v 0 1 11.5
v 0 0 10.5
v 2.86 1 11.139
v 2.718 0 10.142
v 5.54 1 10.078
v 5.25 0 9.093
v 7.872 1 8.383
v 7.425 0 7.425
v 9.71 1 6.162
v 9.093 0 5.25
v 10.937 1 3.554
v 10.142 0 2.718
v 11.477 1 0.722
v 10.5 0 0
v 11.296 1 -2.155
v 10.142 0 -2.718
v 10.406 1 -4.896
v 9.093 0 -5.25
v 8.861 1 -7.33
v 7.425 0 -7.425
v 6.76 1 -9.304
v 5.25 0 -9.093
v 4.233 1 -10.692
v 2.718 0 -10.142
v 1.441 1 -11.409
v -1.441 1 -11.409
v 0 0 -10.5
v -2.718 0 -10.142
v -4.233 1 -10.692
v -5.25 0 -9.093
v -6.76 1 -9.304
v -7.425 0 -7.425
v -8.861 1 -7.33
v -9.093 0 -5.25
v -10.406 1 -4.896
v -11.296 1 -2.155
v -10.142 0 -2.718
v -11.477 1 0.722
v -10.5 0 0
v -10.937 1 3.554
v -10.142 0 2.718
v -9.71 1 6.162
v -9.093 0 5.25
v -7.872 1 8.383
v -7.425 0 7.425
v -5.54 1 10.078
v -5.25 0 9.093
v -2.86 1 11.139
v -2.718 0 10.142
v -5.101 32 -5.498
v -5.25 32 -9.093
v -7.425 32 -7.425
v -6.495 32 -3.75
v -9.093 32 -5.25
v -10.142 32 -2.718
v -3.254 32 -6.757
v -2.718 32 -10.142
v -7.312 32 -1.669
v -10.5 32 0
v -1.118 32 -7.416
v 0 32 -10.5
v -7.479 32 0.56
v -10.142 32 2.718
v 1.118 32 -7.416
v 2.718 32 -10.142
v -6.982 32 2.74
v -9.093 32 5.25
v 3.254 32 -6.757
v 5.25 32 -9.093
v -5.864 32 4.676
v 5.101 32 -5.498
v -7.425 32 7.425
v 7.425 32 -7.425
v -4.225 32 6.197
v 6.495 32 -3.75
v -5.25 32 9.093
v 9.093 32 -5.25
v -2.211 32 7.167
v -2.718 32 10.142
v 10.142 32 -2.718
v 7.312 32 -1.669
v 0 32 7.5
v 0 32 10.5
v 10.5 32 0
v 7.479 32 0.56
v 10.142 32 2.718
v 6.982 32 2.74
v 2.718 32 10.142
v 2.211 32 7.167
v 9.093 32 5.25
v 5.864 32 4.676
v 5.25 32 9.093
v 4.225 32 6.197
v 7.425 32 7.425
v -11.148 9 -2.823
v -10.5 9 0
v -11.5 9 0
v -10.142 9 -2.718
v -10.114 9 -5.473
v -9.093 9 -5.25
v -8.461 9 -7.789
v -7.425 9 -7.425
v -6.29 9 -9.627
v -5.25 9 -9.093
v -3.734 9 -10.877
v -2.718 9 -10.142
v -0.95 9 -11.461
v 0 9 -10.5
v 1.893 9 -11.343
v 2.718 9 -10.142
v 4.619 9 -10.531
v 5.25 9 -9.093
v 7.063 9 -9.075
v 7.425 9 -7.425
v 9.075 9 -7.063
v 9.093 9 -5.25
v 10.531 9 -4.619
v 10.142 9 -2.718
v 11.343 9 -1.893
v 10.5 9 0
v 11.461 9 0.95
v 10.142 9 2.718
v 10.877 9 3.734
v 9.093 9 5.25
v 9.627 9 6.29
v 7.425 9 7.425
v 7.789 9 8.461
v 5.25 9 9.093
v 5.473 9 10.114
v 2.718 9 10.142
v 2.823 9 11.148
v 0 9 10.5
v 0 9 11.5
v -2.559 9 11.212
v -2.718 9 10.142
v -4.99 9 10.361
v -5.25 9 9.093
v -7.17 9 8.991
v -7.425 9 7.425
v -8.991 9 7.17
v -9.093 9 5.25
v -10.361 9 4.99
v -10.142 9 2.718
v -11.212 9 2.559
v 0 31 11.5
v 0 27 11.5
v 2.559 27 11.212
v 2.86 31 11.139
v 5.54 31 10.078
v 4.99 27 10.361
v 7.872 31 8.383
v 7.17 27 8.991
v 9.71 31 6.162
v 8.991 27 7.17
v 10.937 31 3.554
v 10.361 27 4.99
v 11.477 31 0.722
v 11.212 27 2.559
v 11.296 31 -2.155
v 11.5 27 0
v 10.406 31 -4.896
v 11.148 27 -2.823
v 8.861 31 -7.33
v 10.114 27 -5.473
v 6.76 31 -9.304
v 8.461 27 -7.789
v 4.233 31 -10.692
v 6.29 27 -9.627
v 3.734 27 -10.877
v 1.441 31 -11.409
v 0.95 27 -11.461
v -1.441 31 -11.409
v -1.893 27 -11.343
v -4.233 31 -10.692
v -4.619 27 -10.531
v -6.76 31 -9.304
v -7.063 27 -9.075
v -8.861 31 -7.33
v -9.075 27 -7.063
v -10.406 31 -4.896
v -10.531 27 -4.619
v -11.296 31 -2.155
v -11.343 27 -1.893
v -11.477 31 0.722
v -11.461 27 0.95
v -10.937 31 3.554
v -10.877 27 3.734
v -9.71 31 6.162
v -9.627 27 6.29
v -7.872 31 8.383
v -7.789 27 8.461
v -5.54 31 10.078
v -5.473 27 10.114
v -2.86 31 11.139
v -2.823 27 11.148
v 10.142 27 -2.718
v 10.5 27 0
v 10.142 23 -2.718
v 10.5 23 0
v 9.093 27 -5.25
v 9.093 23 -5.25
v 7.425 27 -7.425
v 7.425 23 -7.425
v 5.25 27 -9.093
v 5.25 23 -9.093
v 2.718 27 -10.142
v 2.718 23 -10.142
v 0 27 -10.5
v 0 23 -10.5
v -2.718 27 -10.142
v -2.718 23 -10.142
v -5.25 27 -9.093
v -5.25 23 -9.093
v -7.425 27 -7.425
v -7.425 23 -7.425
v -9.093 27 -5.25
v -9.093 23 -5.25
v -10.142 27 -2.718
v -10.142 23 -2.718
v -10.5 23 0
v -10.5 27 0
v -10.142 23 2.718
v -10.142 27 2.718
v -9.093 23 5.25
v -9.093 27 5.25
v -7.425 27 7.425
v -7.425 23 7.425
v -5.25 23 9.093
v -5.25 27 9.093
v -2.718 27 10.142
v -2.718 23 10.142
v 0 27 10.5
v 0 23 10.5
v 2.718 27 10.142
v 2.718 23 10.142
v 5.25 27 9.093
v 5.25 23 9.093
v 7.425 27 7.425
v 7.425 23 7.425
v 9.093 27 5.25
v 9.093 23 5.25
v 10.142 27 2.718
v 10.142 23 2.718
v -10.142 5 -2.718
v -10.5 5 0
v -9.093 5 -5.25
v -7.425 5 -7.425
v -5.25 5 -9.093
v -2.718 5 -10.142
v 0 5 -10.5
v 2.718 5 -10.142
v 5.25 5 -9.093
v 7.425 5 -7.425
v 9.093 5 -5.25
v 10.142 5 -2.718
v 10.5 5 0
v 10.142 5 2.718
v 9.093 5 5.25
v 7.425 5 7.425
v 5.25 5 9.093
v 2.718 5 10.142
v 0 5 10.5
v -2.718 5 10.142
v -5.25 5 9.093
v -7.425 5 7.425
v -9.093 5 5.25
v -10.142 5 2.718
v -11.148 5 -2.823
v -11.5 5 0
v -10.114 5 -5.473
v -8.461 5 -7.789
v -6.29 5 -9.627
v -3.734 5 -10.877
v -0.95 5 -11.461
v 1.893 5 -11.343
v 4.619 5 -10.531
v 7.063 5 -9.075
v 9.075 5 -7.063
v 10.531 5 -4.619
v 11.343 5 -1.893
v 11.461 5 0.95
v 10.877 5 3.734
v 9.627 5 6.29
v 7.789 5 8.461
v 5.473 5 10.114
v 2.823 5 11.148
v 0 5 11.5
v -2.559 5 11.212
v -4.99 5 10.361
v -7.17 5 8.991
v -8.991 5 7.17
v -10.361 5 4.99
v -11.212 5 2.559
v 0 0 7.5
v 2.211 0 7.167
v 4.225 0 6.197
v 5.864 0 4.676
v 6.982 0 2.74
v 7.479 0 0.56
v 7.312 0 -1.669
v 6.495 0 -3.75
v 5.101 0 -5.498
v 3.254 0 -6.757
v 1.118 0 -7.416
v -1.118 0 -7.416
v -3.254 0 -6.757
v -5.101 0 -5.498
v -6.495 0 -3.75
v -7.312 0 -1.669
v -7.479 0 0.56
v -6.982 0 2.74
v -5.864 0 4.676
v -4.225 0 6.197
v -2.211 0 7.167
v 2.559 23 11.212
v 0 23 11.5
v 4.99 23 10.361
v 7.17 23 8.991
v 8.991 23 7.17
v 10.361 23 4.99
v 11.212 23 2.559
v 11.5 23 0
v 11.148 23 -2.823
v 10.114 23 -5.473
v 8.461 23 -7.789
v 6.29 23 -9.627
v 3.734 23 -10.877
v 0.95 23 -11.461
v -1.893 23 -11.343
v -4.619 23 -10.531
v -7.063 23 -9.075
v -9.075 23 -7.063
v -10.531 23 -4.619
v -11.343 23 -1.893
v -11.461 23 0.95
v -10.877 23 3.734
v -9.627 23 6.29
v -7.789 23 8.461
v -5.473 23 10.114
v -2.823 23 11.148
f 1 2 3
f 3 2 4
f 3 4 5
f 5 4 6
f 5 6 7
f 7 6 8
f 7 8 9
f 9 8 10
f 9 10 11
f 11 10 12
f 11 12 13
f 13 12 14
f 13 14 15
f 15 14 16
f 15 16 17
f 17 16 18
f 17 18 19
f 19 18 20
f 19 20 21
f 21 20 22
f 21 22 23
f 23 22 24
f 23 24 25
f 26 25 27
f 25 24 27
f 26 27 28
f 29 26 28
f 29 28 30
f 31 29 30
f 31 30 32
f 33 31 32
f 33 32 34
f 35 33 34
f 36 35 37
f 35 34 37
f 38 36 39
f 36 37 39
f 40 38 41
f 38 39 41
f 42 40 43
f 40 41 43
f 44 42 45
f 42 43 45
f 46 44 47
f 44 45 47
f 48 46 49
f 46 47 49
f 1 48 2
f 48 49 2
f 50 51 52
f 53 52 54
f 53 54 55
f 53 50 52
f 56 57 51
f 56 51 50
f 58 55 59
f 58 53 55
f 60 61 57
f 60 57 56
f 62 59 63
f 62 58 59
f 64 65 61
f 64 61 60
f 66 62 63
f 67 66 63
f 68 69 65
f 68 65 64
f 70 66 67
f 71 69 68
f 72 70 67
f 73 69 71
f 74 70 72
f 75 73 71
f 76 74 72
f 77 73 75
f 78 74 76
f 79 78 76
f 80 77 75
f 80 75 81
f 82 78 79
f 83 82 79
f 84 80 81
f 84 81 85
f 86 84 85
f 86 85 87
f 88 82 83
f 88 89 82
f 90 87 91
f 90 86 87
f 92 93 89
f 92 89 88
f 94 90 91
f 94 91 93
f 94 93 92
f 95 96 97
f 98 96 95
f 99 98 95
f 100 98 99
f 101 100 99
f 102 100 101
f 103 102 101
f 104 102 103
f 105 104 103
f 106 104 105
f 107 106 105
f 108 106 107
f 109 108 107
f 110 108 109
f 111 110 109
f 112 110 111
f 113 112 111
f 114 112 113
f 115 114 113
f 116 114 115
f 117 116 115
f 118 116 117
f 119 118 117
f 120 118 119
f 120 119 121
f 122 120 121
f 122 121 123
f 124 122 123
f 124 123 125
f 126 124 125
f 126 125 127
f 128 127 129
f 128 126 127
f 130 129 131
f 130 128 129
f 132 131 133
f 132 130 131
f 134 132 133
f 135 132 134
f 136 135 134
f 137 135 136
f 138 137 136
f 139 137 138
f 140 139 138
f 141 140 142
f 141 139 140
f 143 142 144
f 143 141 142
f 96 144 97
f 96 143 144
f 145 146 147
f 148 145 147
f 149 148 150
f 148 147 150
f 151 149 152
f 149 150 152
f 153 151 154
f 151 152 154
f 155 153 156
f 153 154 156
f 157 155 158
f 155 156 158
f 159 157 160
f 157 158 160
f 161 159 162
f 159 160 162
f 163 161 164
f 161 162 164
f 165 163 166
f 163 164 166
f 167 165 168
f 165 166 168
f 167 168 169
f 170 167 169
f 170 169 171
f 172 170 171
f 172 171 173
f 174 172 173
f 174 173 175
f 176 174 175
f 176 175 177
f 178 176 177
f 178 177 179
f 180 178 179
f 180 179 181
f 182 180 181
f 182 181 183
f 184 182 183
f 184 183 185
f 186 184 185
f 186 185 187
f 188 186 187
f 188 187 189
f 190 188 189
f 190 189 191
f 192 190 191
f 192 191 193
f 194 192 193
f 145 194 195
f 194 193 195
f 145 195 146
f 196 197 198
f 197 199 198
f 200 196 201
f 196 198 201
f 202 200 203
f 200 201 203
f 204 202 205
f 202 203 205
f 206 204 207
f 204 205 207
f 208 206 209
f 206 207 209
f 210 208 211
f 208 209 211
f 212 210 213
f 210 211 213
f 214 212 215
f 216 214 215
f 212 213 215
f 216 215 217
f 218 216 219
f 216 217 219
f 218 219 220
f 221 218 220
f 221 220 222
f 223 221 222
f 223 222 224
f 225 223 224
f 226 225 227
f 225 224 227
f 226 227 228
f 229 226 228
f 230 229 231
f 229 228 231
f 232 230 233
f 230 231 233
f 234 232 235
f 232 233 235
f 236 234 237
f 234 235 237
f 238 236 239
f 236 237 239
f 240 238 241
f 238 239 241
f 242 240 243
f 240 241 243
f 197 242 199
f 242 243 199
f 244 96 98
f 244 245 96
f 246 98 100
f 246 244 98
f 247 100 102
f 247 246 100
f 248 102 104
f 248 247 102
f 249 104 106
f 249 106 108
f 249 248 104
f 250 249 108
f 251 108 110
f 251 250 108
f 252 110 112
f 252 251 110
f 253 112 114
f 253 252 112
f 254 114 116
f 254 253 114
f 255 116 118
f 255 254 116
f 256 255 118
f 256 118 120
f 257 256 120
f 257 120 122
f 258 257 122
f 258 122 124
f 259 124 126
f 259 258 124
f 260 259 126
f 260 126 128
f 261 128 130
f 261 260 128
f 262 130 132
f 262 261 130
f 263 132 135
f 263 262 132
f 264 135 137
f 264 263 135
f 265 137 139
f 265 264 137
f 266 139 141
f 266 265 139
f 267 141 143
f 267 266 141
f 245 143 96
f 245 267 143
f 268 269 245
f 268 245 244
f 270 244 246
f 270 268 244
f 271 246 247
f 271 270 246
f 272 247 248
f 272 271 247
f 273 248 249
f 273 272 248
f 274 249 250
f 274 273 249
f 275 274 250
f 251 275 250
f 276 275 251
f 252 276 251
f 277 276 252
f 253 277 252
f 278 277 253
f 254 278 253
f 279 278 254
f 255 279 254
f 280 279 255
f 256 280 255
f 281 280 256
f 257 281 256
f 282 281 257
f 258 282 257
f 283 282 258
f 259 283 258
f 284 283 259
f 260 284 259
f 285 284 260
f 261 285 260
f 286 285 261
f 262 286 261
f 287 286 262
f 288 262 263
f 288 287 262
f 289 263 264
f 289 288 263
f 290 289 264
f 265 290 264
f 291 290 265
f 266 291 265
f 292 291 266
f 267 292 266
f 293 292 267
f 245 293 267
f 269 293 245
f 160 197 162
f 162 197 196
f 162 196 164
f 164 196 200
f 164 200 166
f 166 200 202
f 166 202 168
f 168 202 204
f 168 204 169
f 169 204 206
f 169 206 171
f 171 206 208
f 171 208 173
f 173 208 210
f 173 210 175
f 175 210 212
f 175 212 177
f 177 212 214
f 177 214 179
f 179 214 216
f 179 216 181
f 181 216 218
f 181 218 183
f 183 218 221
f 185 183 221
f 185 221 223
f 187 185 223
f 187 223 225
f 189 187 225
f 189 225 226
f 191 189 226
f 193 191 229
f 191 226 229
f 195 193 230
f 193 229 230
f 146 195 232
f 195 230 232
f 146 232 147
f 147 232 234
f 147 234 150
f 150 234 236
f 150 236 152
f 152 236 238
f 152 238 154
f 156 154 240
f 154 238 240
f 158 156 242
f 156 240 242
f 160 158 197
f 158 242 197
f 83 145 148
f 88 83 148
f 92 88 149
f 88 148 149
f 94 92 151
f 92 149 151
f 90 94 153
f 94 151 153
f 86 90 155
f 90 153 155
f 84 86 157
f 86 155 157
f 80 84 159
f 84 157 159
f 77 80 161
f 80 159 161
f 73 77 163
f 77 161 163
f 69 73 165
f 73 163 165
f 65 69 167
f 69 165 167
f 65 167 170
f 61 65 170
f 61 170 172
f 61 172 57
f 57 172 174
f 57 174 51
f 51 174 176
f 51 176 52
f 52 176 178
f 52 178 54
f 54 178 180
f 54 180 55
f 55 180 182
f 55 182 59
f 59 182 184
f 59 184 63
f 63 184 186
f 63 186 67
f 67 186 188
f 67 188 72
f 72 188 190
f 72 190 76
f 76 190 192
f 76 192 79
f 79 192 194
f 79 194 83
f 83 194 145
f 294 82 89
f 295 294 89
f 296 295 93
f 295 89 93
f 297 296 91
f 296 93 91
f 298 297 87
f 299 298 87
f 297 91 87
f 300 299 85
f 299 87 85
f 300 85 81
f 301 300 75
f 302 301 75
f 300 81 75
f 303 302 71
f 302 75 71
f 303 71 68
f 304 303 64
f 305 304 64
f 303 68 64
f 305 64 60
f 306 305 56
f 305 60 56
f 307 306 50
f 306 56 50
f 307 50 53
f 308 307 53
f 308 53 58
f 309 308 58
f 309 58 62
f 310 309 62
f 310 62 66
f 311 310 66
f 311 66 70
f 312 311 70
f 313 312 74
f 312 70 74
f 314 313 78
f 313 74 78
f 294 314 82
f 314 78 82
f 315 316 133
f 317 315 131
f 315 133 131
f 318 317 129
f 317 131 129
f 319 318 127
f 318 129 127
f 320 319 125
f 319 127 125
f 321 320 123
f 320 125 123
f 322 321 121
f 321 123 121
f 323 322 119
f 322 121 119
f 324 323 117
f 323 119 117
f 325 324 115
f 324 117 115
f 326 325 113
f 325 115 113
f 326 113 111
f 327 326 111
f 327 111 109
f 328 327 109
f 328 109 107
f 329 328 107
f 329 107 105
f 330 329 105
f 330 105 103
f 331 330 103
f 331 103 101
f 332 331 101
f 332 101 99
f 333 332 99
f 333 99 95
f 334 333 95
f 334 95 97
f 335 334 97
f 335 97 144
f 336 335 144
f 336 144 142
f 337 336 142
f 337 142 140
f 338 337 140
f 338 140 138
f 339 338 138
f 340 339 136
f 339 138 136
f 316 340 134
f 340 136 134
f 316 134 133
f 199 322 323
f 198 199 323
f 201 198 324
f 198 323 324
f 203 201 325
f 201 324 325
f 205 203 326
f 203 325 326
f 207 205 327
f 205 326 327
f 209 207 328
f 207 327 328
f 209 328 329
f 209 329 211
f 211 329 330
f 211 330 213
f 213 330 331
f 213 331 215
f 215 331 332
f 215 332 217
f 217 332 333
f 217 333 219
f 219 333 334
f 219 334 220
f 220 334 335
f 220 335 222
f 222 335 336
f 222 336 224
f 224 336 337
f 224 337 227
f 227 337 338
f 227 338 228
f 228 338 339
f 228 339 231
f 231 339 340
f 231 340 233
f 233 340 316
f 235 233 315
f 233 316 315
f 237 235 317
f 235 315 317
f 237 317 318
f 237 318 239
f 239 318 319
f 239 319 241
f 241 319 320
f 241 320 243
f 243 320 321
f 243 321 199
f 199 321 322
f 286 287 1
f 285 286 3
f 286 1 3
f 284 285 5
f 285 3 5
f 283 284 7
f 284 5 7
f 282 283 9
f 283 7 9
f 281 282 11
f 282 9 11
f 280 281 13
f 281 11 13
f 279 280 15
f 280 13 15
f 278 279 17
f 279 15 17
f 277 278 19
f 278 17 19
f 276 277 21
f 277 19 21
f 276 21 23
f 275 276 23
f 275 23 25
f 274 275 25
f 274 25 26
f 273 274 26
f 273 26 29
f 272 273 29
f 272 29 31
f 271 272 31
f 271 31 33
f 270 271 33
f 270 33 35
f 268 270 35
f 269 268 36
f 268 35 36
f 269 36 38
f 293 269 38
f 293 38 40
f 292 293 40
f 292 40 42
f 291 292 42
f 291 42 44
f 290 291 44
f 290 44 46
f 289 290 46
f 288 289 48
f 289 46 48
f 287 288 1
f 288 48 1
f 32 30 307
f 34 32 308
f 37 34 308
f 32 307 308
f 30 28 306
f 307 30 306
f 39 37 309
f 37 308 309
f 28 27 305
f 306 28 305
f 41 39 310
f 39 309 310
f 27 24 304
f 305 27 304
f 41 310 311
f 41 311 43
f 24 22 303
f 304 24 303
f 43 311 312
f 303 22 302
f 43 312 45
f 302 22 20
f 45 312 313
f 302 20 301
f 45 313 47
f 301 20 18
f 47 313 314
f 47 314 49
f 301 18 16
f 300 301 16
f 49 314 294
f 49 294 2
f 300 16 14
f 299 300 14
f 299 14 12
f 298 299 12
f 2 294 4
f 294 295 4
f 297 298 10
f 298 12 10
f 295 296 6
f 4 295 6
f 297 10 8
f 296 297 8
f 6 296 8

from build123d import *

# Parameters (mm, degrees)
SKETCH1_R           = 11.5
BOSS_EXTRUDE1_DEPTH = 32
SKETCH2_R           = 7.5
CUT_EXTRUDE1_DEPTH  = 32
SKETCH3_W           = 1
SKETCH3_H           = 4
SKETCH5_W           = 1
SKETCH5_H           = 4
CHAMFER2_SIZE       = 1


with BuildPart() as part:
    # Sketch1 → Boss-Extrude1 (new body)
    with BuildSketch(Plane(origin=(0, 0, 0), x_dir=(1, 0, 0), z_dir=(0, 1, 0))):
        with Locations(Location((0, 0, 0), (0, 0, 270))):
            Circle(SKETCH1_R)
    extrude(amount=BOSS_EXTRUDE1_DEPTH)

    # Sketch2 → Cut-Extrude1 (cut)
    with BuildSketch(Plane(origin=(0, 32, 0), x_dir=(1, 0, 0), z_dir=(0, 1, 0))):
        with Locations(Location((0, 0, 0), (0, 0, 270))):
            Circle(SKETCH2_R)
    extrude(amount=-CUT_EXTRUDE1_DEPTH, mode=Mode.SUBTRACT)

    # Cut-Sweep1: sweep along a path in Sketch4
    with BuildLine(Plane(origin=(0, 7, 0), x_dir=(-1, 0, 0), z_dir=(0, -1, 0))) as cut_sweep1_path:
        CenterArc((0, 0), 11, 0, 360)
    # Sketch3 → Cut-Sweep1 (sweep, cut)
    with BuildSketch(Plane.XY):
        with Locations((11, 7)):
            Rectangle(SKETCH3_W, SKETCH3_H)
    sweep(path=cut_sweep1_path.line, mode=Mode.SUBTRACT)

    # Cut-Sweep2: sweep along a path in Sketch6
    with BuildLine(Plane(origin=(0, 25, 0), x_dir=(1, 0, 0), z_dir=(0, 1, 0))) as cut_sweep2_path:
        CenterArc((0, 0), 11, 0, 360)
    # Sketch5 → Cut-Sweep2 (sweep, cut)
    with BuildSketch(Plane(origin=(0, 0, 0), x_dir=(0, 0, -1), z_dir=(1, 0, 0))):
        with Locations((11, 25)):
            Rectangle(SKETCH5_W, SKETCH5_H)
    sweep(path=cut_sweep2_path.line, mode=Mode.SUBTRACT)

    # Chamfer2
    chamfer2_edges = [part.edges().sort_by_distance(p)[0] for p in [
        (0, 0, -11.5),
        (0, 32, -11.5),
    ]]
    chamfer(chamfer2_edges, length=CHAMFER2_SIZE)


solid = part.part
